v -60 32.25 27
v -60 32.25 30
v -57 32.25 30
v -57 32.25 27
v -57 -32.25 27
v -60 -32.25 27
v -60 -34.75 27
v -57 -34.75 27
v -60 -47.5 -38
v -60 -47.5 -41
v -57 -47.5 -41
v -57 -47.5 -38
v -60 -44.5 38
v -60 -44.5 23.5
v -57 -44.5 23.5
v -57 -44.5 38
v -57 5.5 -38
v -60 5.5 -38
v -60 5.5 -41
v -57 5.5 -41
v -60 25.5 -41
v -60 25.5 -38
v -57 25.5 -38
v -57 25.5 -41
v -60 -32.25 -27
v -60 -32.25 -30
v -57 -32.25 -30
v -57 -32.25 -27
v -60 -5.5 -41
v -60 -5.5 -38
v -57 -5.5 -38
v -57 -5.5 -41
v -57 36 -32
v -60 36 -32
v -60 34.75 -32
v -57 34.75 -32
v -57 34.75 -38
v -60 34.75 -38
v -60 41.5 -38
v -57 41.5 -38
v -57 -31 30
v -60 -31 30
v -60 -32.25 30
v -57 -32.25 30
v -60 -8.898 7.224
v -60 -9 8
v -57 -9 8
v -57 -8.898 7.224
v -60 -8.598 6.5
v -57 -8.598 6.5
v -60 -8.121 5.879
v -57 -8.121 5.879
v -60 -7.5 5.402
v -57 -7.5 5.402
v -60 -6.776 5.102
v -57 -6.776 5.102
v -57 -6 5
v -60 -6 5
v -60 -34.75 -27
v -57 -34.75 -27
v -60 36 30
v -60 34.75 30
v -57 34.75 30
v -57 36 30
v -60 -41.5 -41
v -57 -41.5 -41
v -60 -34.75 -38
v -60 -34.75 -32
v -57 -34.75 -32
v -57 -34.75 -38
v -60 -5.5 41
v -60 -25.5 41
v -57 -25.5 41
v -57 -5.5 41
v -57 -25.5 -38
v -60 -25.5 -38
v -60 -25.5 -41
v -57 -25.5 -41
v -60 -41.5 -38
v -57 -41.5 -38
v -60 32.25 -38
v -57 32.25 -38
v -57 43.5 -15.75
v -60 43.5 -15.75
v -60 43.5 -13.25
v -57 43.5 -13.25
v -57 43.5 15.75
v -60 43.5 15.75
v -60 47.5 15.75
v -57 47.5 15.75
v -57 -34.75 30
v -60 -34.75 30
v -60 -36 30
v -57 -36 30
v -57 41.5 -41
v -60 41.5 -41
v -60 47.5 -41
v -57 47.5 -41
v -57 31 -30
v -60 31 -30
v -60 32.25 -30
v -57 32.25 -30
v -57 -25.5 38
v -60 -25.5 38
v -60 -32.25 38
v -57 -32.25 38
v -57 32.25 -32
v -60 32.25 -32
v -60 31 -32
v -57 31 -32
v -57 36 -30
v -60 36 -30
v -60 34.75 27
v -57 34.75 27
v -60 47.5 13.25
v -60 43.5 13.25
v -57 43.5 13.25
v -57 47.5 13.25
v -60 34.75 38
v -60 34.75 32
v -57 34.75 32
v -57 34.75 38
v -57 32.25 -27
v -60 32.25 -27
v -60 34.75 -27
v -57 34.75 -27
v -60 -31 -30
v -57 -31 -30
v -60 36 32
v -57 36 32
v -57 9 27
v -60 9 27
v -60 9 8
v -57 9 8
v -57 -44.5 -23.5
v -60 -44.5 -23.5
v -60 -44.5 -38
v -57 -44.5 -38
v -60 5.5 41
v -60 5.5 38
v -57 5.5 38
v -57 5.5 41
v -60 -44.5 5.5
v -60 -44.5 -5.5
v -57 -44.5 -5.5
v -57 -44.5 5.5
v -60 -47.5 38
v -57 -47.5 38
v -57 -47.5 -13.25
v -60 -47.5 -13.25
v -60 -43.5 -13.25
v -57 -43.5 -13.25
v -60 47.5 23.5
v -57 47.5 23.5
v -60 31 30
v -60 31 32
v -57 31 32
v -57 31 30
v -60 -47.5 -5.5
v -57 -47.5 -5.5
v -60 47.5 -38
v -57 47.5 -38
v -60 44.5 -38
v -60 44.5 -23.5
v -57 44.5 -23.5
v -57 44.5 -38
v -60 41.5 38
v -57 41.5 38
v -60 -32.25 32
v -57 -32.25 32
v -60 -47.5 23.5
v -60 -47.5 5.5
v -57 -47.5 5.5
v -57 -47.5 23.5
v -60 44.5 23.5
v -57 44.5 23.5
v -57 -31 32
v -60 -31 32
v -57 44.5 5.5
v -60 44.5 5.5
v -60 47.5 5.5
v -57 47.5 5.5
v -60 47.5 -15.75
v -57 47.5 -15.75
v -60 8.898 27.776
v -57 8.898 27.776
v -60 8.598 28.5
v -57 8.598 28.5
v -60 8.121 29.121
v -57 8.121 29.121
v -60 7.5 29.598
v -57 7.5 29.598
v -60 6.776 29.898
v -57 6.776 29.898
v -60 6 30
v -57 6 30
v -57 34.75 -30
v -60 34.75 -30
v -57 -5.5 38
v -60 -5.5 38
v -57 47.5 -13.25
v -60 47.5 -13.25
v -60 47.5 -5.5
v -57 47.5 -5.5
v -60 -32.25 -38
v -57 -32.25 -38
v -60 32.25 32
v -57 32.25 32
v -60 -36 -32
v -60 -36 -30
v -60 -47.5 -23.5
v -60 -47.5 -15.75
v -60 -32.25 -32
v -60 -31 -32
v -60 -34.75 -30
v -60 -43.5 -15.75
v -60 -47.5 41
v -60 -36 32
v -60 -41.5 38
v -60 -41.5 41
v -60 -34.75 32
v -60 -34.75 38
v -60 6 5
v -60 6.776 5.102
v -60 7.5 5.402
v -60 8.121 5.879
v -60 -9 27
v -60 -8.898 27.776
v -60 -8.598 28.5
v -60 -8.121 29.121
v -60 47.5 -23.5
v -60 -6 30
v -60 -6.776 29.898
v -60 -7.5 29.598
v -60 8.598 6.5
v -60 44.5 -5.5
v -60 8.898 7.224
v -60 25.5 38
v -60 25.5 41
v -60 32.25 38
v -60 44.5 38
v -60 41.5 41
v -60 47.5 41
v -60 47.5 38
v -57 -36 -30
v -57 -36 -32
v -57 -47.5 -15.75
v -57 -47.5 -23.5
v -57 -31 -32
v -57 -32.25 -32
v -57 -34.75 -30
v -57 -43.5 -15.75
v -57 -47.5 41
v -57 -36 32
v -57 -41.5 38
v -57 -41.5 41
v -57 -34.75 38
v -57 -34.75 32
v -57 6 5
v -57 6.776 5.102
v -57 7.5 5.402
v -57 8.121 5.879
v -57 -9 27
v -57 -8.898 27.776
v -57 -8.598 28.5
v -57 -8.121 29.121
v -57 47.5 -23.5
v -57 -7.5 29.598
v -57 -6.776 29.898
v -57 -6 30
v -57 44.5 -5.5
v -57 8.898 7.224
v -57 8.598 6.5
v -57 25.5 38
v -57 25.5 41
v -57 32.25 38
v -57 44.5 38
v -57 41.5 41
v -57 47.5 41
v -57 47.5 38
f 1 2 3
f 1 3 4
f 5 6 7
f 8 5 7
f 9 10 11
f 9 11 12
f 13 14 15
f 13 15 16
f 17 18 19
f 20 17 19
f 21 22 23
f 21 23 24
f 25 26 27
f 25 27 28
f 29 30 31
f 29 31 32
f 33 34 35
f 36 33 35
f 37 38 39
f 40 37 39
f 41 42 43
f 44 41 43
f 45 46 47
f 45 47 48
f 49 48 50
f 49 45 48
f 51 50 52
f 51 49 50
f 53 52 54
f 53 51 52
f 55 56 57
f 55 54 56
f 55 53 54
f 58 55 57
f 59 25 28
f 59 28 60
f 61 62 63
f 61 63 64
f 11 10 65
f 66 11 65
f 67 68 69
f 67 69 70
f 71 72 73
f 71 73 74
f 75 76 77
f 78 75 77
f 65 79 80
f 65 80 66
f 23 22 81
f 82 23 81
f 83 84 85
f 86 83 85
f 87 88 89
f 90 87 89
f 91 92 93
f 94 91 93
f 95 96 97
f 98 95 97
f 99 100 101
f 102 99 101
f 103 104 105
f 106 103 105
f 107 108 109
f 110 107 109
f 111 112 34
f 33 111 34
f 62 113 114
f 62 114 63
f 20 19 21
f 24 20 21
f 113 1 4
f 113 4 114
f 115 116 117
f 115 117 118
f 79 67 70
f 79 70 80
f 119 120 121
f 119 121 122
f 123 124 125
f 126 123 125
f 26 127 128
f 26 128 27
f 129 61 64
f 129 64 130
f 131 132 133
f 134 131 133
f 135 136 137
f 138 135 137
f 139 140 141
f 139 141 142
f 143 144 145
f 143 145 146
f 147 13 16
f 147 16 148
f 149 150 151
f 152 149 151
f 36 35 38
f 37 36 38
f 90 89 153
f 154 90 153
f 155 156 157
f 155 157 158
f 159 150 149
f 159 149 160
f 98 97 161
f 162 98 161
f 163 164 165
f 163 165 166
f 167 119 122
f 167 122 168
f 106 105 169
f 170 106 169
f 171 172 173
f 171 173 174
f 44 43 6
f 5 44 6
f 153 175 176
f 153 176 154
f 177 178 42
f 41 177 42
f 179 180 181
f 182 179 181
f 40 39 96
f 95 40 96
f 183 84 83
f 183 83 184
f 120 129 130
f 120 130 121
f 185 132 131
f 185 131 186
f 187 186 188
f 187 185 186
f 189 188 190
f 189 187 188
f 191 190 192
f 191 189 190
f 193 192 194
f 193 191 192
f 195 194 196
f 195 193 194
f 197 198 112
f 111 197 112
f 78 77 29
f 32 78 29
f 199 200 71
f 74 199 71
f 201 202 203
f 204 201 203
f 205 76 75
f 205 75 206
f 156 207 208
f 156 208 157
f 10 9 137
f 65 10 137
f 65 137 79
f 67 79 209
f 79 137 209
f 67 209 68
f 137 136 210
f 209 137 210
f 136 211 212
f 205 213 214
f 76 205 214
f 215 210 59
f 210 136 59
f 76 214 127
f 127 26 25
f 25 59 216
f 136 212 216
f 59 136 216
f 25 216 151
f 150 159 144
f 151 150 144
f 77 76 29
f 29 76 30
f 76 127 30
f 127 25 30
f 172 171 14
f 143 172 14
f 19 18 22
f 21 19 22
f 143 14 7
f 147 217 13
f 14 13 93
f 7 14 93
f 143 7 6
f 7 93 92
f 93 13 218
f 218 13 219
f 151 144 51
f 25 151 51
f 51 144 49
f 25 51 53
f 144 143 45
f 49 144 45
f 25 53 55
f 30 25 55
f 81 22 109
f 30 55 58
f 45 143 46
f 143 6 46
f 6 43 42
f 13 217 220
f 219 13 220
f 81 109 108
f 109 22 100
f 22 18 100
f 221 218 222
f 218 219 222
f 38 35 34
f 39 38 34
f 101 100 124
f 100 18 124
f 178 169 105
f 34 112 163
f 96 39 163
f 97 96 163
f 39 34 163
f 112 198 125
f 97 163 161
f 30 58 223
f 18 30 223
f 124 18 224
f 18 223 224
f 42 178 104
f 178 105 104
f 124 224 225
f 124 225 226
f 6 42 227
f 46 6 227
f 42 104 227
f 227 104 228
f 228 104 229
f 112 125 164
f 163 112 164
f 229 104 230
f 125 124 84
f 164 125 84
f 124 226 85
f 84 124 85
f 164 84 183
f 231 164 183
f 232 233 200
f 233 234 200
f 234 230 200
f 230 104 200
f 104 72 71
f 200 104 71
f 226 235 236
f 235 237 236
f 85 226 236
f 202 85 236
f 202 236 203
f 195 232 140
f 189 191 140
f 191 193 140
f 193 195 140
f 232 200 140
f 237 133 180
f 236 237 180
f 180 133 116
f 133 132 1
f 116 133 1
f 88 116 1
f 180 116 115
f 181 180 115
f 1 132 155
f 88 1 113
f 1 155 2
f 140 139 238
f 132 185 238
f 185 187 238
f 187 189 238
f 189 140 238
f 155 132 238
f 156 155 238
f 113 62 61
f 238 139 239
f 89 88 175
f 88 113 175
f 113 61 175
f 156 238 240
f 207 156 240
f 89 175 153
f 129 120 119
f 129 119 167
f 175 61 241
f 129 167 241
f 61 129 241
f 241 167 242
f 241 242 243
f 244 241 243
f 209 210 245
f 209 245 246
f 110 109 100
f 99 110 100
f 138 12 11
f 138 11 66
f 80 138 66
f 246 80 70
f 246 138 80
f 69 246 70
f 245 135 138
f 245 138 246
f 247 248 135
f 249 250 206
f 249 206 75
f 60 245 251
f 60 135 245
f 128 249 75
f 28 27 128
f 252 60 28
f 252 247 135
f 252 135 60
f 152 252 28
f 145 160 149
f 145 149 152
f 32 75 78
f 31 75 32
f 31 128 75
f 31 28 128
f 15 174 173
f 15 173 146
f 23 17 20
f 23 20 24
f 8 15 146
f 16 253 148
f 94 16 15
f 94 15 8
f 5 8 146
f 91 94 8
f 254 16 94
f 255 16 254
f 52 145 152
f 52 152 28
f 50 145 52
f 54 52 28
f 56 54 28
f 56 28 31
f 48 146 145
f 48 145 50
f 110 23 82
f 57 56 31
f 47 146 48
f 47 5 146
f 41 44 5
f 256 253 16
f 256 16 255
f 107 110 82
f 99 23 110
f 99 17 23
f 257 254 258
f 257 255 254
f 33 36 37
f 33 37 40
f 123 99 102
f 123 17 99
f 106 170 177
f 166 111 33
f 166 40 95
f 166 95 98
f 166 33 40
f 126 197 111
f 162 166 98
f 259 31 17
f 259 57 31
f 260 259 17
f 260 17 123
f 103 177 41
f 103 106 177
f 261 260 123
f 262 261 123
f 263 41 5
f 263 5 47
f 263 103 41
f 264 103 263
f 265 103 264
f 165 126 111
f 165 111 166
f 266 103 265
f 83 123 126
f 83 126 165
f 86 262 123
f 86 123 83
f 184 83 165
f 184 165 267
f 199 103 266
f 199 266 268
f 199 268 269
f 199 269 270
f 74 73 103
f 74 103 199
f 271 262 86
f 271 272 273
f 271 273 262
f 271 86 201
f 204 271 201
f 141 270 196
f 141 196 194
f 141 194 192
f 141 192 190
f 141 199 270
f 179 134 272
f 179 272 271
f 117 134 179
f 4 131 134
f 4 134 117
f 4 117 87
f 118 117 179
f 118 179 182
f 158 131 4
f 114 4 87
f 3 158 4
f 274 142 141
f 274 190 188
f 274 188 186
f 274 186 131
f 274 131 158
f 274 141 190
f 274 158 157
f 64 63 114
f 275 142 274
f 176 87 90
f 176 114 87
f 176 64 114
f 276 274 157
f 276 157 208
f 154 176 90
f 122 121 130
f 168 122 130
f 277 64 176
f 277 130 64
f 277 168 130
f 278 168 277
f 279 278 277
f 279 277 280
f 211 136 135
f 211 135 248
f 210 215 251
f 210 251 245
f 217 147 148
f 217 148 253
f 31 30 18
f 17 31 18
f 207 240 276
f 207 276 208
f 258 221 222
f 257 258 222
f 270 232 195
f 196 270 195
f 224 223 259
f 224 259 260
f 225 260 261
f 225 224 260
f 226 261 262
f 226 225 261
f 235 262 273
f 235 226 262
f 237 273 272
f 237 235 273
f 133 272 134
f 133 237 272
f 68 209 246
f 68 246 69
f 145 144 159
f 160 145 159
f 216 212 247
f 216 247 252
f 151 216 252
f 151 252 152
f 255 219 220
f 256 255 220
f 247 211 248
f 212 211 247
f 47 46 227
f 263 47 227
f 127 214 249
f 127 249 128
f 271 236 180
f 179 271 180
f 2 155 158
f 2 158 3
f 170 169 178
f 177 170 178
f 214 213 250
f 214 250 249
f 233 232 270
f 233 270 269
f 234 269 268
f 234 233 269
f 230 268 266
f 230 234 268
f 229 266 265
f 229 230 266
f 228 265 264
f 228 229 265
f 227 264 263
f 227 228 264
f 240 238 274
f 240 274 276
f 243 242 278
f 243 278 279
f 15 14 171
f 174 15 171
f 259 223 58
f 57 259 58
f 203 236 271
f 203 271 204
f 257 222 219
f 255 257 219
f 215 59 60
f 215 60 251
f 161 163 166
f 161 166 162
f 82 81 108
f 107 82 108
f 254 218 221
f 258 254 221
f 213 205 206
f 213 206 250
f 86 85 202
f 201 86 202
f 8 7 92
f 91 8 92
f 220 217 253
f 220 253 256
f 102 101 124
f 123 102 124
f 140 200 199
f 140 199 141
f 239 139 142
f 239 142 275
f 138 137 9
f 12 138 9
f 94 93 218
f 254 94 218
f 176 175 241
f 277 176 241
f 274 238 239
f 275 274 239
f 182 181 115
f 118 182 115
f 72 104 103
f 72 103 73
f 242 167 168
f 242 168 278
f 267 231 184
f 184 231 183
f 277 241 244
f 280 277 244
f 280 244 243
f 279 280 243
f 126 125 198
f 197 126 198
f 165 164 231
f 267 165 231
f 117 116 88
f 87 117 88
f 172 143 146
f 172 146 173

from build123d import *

# Parameters (mm, degrees)
SKETCH024_W                   = 95
SKETCH024_H                   = 82
PAD006_DEPTH                  = 3
SKETCH025_W                   = 11
SKETCH025_H                   = 3
SKETCH025_W_2                 = 16
SKETCH025_W_3                 = 3
SKETCH025_H_2                 = 11
SKETCH025_H_3                 = 14.5
POCKET018_DEPTH               = 254.062745
POCKET019_DEPTH               = 254.062745
POCKET019_MIRRORED022_2_DEPTH = 254.062745
POCKET020_DEPTH               = 3.001
SKETCH025_MIRRORED024_2_W     = 11
SKETCH025_MIRRORED024_2_H     = 3
SKETCH025_MIRRORED024_2_W_2   = 16
SKETCH025_MIRRORED024_2_W_3   = 3
SKETCH025_MIRRORED024_2_H_2   = 11
SKETCH025_MIRRORED024_2_H_3   = 14.5
POCKET018_MIRRORED024_2_DEPTH = 254.062745
SKETCH028_W                   = 4
SKETCH028_H                   = 2.5
POCKET021_DEPTH               = 3.001


with BuildPart() as part:
    # Sketch024 → Pad006 (new body)
    with BuildSketch(Plane.YZ):
        Rectangle(SKETCH024_W, SKETCH024_H)
    extrude(amount=PAD006_DEPTH)

    # Sketch025 → Pocket018 (cut, through all)
    with BuildSketch(Plane.YZ):
        with Locations((0, 39.5)):
            Rectangle(SKETCH025_W, SKETCH025_H)
        with Locations((33.5, 39.5)):
            Rectangle(SKETCH025_W_2, SKETCH025_H)
        with Locations((46, 0)):
            Rectangle(SKETCH025_W_3, SKETCH025_H_2)
        with Locations((46, 30.75)):
            Rectangle(SKETCH025_W_3, SKETCH025_H_3)
    pocket018 = extrude(amount=POCKET018_DEPTH, mode=Mode.SUBTRACT)

    # Sketch026 → Pocket019 (cut, through all)
    with BuildSketch(Plane.YZ):
        Polygon((-32.25, 41), (-32.25, 32), (-31, 32), (-31, 30), (-32.25, 30), (-32.25, 27), (-34.75, 27), (-34.75, 30), (-36, 30), (-36, 32), (-34.75, 32), (-34.75, 41), align=None)
    pocket019 = extrude(amount=POCKET019_DEPTH, mode=Mode.SUBTRACT)

    # Sketch026 Mirrored022 2 → Pocket019 Mirrored022 2 (cut, through all)
    with BuildSketch(Plane(origin=(0, 0, 0), x_dir=(0, -1, 0), z_dir=(-1, 0, 0))):
        Polygon((-32.25, 41), (-32.25, 32), (-31, 32), (-31, 30), (-32.25, 30), (-32.25, 27), (-34.75, 27), (-34.75, 30), (-36, 30), (-36, 32), (-34.75, 32), (-34.75, 41), align=None)
    pocket019_mirrored022_2 = extrude(amount=-POCKET019_MIRRORED022_2_DEPTH, mode=Mode.SUBTRACT)

    # Mirrored023: Pocket019, Pocket019 Mirrored022 2 across Sketch026 H_Axis
    add(pocket019.mirror(Plane.XY), mode=Mode.SUBTRACT)
    add(pocket019_mirrored022_2.mirror(Plane.XY), mode=Mode.SUBTRACT)

    # Sketch027 → Pocket020 (cut, through all)
    with BuildSketch(Plane.YZ):
        with BuildLine():
            Line((-6, 30), (6, 30))
            ThreePointArc((9, 27), (8.12132, 29.12132), (6, 30))
            Line((9, 27), (9, 8))
            ThreePointArc((6, 5), (8.12132, 5.87868), (9, 8))
            Line((6, 5), (-6, 5))
            ThreePointArc((-9, 8), (-8.12132, 5.87868), (-6, 5))
            Line((-9, 8), (-9, 27))
            ThreePointArc((-6, 30), (-8.12132, 29.12132), (-9, 27))
        make_face()
    extrude(amount=POCKET020_DEPTH, mode=Mode.SUBTRACT)

    # Sketch025 Mirrored024 2 → Pocket018 Mirrored024 2 (cut, through all)
    with BuildSketch(Plane(origin=(0, 0, 0), x_dir=(0, -1, 0), z_dir=(-1, 0, 0))):
        with Locations((0, 39.5)):
            Rectangle(SKETCH025_MIRRORED024_2_W, SKETCH025_MIRRORED024_2_H)
        with Locations((33.5, 39.5)):
            Rectangle(SKETCH025_MIRRORED024_2_W_2, SKETCH025_MIRRORED024_2_H)
        with Locations((46, 0)):
            Rectangle(SKETCH025_MIRRORED024_2_W_3, SKETCH025_MIRRORED024_2_H_2)
        with Locations((46, 30.75)):
            Rectangle(SKETCH025_MIRRORED024_2_W_3, SKETCH025_MIRRORED024_2_H_3)
    pocket018_mirrored024_2 = extrude(amount=-POCKET018_MIRRORED024_2_DEPTH, mode=Mode.SUBTRACT)

    # Mirrored025: Pocket018, Pocket018 Mirrored024 2 across Sketch025 H_Axis
    add(pocket018.mirror(Plane.XY), mode=Mode.SUBTRACT)
    add(pocket018_mirrored024_2.mirror(Plane.XY), mode=Mode.SUBTRACT)

    # Sketch028 → Pocket021 (cut, through all)
    with BuildSketch(Plane.YZ):
        with Locations((-45.5, -14.5)):
            Rectangle(SKETCH028_W, SKETCH028_H)
        with Locations((45.5, -14.5)):
            Rectangle(SKETCH028_W, SKETCH028_H)
        with Locations((45.5, 14.5)):
            Rectangle(SKETCH028_W, SKETCH028_H)
    extrude(amount=POCKET021_DEPTH, mode=Mode.SUBTRACT)


with BuildPart() as part_1:
    # Body006 placement: moved
    add(part.part.moved(Location((-60, 0, 0))))


solid = part_1.part
